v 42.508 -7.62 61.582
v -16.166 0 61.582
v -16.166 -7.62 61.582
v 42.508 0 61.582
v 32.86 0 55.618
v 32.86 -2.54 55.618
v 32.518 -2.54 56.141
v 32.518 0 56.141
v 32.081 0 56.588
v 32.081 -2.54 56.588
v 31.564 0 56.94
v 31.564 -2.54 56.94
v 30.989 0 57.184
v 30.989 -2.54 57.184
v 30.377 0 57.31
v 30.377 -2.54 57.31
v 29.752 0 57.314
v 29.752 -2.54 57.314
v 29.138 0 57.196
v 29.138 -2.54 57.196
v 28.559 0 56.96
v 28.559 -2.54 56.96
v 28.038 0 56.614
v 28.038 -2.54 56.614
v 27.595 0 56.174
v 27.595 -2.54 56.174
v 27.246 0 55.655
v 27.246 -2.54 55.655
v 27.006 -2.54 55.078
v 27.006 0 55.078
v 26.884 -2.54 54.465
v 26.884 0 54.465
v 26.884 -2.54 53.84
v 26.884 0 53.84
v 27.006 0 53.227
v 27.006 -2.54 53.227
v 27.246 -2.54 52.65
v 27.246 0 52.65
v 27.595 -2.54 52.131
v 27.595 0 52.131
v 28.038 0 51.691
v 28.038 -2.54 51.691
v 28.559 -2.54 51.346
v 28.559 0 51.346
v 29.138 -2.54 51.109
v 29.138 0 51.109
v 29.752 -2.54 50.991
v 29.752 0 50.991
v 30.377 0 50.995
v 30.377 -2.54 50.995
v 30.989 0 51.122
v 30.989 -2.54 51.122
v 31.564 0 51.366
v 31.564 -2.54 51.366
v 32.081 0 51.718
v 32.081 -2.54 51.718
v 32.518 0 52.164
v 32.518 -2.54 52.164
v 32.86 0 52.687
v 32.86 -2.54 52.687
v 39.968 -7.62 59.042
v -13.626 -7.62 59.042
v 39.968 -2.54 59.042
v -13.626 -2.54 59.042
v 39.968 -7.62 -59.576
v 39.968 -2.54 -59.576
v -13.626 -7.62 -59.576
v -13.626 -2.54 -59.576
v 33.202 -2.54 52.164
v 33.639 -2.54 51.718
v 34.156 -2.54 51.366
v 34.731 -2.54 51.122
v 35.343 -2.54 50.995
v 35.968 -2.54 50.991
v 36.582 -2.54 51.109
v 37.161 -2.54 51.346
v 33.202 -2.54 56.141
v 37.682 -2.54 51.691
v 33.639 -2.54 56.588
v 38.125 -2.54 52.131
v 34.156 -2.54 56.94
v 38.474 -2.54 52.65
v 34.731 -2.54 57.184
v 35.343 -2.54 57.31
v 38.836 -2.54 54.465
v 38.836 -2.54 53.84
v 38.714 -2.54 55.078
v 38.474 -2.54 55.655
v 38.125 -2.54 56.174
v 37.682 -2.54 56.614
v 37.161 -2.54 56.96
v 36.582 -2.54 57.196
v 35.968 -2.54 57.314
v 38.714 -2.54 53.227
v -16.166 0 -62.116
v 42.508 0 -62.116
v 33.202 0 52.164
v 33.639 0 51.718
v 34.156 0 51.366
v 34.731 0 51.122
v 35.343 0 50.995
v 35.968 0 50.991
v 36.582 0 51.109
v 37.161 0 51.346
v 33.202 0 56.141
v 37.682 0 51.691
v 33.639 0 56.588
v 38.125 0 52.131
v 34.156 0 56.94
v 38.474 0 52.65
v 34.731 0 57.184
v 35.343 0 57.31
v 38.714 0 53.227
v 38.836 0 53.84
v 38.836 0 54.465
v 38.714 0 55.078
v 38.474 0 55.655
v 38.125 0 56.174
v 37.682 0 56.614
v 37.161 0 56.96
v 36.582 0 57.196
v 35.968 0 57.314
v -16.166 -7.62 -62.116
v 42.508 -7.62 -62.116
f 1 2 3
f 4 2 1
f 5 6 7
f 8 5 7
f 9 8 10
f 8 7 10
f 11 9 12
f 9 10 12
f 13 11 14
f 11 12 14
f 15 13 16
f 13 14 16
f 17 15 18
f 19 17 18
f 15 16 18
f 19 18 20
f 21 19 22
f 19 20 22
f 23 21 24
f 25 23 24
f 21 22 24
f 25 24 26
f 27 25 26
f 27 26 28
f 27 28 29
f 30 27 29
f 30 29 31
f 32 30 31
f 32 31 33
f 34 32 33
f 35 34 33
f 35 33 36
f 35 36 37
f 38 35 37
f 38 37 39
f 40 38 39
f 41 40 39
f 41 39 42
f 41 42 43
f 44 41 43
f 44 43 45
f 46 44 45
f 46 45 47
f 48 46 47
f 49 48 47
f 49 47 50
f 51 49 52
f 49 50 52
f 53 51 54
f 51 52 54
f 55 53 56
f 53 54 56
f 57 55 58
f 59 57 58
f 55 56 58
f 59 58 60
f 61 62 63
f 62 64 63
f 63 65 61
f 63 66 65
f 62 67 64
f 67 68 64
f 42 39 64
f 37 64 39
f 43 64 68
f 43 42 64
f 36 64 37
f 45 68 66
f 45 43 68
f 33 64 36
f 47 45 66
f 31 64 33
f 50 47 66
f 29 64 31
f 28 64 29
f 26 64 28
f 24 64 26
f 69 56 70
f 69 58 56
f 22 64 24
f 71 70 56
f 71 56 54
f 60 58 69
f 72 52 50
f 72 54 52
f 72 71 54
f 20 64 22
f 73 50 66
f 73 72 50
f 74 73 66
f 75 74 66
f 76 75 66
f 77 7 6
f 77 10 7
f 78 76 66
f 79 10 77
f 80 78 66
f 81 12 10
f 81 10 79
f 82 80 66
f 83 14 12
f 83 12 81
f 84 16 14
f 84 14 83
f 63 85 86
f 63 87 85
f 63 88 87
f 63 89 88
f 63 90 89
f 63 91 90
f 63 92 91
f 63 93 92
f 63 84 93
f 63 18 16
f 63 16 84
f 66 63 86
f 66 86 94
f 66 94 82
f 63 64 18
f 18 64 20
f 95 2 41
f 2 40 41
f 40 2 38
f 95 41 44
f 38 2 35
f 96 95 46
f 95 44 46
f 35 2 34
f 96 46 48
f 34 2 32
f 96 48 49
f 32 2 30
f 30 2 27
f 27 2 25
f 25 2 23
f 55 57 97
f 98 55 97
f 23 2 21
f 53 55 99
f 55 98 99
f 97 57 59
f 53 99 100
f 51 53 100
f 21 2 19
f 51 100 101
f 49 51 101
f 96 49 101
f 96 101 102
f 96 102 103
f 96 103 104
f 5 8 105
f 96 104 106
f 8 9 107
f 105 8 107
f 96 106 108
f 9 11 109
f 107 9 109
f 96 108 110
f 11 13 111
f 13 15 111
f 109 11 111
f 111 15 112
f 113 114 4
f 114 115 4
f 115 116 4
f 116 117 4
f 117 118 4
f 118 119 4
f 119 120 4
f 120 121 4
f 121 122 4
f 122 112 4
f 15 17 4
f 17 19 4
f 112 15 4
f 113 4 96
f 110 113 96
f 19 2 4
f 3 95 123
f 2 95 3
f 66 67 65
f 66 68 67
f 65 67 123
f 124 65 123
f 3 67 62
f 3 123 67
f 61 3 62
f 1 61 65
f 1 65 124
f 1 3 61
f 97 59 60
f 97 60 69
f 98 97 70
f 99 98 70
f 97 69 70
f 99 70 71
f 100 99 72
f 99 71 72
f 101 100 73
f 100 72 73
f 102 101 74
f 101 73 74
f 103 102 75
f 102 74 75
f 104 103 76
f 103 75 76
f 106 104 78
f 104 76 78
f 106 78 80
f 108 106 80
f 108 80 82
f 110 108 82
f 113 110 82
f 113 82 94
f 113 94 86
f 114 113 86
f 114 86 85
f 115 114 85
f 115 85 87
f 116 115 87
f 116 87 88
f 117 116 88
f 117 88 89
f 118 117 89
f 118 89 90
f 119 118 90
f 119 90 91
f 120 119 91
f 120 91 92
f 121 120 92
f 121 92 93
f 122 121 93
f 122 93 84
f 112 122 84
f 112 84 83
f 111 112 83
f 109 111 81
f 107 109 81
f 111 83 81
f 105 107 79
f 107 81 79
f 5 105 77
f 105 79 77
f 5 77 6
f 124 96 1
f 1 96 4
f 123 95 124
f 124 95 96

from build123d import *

# Parameters (mm, degrees)
F0_W     = 58.674
F0_H     = 123.698
F1_DEPTH = 7.62
F2_T     = -2.54
F4_D     = 6.35


with BuildPart() as f1:
    # F0 (on Front) → F1 (new body)
    with BuildSketch(Plane.XZ):
        with Locations((13.1707786496, -0.2674552867)):
            Rectangle(F0_W, F0_H)
    extrude(amount=F1_DEPTH)

    # F2
    f2_openings = [f1.faces().sort_by_distance(p)[0] for p in [
        (13.170779, -7.62, -0.267455),
    ]]
    offset(amount=F2_T, openings=f2_openings)

    # F4 (through all)
    with Locations(Plane(origin=(0, 0, 0), x_dir=(1, 0, 0), z_dir=(0, 1, 0))):
        with Locations((30.0433114171, -54.1525930166), (35.6767475605, -54.1525930166)):
            Hole(F4_D / 2)


solid = f1.part
